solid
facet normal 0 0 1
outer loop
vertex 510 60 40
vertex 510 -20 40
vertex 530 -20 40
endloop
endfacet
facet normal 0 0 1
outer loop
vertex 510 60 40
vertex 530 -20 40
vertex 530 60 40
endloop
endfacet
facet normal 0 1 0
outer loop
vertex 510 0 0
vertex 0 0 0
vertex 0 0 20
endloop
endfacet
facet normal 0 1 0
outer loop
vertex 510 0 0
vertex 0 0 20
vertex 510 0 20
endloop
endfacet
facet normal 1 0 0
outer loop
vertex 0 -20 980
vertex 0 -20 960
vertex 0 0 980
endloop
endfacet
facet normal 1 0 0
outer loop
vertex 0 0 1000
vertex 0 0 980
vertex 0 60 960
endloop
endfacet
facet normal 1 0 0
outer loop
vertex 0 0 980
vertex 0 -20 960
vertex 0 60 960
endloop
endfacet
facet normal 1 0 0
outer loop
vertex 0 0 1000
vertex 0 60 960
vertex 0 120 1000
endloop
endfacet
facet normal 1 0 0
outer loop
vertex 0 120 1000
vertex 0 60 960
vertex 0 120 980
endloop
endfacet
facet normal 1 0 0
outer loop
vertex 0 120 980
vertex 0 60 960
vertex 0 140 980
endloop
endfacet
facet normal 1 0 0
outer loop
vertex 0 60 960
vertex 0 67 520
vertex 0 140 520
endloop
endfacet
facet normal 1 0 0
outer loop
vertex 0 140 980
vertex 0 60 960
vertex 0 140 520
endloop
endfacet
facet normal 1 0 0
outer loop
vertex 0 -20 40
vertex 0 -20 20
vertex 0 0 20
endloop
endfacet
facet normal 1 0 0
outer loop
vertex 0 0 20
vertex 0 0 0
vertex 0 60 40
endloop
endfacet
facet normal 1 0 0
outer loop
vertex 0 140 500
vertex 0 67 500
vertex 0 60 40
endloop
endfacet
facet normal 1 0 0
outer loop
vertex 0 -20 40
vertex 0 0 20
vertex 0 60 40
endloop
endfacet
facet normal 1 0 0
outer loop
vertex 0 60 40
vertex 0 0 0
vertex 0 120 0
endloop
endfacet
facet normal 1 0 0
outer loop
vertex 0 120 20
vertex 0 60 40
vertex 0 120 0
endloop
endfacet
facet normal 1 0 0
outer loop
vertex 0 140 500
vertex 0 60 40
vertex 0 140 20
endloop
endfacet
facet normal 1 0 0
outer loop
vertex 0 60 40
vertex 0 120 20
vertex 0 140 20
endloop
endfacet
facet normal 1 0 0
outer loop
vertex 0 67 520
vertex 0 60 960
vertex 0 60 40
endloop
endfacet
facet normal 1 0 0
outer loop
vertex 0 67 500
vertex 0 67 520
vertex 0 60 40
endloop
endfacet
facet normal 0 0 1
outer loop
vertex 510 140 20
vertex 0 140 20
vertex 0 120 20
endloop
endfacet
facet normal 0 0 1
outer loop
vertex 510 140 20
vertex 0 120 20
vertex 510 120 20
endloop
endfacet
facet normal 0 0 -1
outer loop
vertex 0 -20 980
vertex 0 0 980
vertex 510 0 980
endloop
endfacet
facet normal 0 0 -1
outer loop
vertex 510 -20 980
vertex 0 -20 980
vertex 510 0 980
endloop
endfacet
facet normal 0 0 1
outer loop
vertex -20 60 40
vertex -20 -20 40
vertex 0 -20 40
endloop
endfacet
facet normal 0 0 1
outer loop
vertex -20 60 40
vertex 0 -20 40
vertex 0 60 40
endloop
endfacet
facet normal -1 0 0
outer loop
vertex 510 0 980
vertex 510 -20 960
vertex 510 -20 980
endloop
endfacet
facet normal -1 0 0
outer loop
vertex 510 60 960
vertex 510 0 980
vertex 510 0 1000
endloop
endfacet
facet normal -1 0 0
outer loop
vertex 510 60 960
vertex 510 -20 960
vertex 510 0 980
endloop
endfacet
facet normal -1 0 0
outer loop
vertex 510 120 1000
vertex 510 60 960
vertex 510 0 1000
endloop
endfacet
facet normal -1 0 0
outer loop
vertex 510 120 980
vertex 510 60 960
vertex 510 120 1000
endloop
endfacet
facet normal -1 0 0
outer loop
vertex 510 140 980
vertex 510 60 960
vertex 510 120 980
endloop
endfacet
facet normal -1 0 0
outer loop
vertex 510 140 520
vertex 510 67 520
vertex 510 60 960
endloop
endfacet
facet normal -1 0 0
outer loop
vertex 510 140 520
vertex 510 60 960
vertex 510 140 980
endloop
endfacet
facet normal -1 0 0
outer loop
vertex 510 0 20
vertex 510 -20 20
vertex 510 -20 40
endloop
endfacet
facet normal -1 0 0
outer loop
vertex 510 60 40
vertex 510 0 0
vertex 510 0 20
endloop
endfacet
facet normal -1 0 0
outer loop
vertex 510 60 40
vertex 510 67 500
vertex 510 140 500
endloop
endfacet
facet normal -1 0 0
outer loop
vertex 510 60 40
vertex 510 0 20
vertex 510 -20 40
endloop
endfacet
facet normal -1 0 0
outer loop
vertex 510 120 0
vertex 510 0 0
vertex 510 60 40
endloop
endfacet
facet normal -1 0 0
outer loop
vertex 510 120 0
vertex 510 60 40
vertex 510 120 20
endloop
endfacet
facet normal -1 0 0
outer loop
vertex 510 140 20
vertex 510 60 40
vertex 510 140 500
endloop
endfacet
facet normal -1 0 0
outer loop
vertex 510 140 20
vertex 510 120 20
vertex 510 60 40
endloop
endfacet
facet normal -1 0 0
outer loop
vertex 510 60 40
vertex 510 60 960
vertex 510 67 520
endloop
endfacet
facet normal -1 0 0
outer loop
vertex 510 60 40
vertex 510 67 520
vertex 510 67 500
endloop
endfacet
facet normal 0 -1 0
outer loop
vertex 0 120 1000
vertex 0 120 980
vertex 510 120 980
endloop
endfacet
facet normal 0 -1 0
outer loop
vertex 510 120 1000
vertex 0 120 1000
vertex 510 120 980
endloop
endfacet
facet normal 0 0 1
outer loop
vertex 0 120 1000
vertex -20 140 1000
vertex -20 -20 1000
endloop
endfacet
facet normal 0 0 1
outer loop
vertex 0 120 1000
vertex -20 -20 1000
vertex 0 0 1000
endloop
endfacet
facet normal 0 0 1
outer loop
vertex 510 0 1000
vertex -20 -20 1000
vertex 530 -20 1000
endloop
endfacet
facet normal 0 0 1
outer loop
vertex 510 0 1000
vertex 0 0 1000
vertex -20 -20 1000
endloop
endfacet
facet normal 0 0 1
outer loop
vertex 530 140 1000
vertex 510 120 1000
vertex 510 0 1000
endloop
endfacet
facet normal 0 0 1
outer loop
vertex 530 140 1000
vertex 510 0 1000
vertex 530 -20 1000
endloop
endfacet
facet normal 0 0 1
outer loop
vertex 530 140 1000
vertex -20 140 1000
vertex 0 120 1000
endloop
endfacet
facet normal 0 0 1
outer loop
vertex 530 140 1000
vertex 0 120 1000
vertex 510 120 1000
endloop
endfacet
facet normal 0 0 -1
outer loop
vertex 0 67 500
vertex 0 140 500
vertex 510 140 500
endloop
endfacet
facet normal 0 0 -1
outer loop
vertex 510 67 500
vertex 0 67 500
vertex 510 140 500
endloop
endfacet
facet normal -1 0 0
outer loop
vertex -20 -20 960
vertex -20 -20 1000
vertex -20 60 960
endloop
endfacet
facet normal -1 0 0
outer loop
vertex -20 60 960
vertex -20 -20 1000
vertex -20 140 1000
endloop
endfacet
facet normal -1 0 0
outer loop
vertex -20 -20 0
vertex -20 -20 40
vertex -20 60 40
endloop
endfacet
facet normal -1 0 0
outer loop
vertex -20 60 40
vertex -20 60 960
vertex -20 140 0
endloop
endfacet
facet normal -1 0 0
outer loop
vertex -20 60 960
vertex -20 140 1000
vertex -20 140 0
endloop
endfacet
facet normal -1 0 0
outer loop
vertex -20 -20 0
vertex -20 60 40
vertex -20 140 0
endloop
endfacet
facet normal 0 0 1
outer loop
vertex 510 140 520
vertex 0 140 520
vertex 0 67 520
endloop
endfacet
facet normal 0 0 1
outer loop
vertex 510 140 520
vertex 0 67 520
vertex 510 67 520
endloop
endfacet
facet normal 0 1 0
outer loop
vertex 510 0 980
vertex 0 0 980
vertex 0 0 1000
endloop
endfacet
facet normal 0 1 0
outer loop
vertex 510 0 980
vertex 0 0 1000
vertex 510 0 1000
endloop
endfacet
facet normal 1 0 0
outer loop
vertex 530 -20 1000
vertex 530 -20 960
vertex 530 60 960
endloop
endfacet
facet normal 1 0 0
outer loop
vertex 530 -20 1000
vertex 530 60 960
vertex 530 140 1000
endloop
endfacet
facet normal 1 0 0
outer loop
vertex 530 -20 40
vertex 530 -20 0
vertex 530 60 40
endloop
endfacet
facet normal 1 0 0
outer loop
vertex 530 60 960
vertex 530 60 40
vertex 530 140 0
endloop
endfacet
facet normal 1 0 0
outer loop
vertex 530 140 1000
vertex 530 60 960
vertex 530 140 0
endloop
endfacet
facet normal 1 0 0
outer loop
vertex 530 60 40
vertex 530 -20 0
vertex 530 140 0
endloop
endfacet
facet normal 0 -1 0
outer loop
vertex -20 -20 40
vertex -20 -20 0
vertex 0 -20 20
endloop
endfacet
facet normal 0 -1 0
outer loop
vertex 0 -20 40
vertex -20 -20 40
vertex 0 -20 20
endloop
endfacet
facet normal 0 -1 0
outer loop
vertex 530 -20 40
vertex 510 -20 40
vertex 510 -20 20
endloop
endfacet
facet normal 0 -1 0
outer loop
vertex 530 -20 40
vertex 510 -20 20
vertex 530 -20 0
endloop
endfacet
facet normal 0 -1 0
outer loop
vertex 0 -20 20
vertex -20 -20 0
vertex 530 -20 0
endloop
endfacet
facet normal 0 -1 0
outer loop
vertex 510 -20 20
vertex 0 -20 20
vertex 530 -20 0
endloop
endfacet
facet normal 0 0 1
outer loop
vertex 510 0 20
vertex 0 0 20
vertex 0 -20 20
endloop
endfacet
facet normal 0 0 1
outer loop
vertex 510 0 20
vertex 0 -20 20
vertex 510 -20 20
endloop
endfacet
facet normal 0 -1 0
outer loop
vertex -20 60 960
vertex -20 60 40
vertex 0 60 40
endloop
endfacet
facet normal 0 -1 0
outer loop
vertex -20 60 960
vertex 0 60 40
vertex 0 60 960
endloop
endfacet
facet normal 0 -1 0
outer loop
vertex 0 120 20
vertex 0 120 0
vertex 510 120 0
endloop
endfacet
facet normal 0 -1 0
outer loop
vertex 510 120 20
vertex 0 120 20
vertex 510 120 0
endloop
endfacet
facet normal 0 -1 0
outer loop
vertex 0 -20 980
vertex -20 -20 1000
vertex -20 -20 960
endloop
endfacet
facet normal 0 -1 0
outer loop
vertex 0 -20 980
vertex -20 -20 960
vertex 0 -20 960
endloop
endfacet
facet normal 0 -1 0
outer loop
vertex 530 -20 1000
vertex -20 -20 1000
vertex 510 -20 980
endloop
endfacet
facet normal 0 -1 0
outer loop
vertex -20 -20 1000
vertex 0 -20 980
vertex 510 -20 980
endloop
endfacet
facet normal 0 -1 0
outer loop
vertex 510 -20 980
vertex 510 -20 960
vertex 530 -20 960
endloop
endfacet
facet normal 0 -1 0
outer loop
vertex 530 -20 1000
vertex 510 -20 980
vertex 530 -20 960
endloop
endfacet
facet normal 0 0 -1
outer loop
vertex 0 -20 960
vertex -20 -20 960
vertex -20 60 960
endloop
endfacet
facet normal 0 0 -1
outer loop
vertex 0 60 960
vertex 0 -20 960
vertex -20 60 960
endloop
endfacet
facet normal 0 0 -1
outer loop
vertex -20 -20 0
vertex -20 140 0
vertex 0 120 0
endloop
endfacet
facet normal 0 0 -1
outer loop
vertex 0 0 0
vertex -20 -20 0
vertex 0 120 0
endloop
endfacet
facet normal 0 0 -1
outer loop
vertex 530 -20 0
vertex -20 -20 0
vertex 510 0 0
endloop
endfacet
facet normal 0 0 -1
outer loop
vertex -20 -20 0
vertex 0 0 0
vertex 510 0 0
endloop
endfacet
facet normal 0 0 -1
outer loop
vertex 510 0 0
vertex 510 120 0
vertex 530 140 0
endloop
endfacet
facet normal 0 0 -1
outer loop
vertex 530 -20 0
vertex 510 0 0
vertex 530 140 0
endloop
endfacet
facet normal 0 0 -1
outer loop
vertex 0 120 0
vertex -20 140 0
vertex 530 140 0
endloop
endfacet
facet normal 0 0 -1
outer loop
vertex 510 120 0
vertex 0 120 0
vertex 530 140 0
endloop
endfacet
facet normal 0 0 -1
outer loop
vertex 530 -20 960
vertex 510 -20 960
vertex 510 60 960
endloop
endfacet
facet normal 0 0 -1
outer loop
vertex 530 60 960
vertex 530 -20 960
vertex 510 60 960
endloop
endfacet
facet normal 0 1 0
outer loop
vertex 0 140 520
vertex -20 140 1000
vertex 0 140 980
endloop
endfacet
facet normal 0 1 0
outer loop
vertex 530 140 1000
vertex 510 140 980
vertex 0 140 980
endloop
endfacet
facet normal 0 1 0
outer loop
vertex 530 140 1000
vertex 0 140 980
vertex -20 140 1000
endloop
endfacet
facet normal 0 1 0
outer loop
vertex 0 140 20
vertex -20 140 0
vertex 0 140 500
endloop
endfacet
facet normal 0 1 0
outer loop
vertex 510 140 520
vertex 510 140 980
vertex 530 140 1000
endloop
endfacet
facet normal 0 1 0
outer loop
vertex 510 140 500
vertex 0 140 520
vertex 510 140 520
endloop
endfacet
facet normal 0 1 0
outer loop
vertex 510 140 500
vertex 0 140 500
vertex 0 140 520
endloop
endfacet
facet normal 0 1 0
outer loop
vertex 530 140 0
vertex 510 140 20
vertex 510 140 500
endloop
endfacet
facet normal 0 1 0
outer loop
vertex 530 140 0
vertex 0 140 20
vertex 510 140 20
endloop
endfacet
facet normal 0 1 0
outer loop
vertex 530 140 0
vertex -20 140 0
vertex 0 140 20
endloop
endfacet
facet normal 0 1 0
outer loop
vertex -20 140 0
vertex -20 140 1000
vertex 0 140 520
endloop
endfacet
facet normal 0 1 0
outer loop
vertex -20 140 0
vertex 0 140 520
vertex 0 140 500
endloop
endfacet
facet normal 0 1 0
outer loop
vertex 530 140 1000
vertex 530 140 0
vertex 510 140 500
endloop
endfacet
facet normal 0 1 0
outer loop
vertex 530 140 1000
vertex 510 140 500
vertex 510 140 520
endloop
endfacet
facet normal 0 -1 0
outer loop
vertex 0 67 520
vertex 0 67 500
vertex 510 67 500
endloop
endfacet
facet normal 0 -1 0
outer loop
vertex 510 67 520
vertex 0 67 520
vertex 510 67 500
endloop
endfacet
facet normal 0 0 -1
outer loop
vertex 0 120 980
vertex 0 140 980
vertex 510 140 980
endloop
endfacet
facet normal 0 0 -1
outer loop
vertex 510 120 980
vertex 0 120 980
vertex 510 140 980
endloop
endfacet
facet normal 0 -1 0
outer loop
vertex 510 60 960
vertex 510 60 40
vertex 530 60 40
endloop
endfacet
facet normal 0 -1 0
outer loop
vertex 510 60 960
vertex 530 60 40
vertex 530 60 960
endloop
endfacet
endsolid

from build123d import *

# Parameters (mm, degrees)
SKETCH1_W           = 550
SKETCH1_H           = 160
SKETCH1_W_2         = 510
SKETCH1_H_2         = 120
BOSS_EXTRUDE1_DEPTH = 1000
SKETCH2_W           = 920
SKETCH2_H           = 80
CUT_EXTRUDE1_DEPTH  = 1000
SKETCH3_W           = 510
SKETCH3_H           = 960
CUT_EXTRUDE3_DEPTH  = 1000
SKETCH4_W           = 550
SKETCH4_H           = 20
BOSS_EXTRUDE2_DEPTH = 73


with BuildPart() as part:
    # Sketch1 → Boss-Extrude1 (new body)
    with BuildSketch(Plane.XY):
        with Locations((255, 60)):
            Rectangle(SKETCH1_W, SKETCH1_H)
        with Locations((255, 60)):
            Rectangle(SKETCH1_W_2, SKETCH1_H_2, mode=Mode.SUBTRACT)
    extrude(amount=BOSS_EXTRUDE1_DEPTH)

    # Sketch2 → Cut-Extrude1 (cut)
    with BuildSketch(Plane.ZY.offset(20)):
        with Locations((500, 20)):
            Rectangle(SKETCH2_W, SKETCH2_H)
    extrude(amount=-CUT_EXTRUDE1_DEPTH, mode=Mode.SUBTRACT)

    # Sketch3 → Cut-Extrude3 (cut)
    with BuildSketch(Plane(origin=(0, 140, 0), x_dir=(1, 0, 0), z_dir=(0, 1, 0))):
        with Locations((255, -500)):
            Rectangle(SKETCH3_W, SKETCH3_H)
    extrude(amount=-CUT_EXTRUDE3_DEPTH, mode=Mode.SUBTRACT)

    # Sketch4 → Boss-Extrude2 (add)
    with BuildSketch(Plane(origin=(0, 140, 0), x_dir=(1, 0, 0), z_dir=(0, 1, 0))):
        with Locations((255, -510)):
            Rectangle(SKETCH4_W, SKETCH4_H)
    extrude(amount=-BOSS_EXTRUDE2_DEPTH)


solid = part.part
